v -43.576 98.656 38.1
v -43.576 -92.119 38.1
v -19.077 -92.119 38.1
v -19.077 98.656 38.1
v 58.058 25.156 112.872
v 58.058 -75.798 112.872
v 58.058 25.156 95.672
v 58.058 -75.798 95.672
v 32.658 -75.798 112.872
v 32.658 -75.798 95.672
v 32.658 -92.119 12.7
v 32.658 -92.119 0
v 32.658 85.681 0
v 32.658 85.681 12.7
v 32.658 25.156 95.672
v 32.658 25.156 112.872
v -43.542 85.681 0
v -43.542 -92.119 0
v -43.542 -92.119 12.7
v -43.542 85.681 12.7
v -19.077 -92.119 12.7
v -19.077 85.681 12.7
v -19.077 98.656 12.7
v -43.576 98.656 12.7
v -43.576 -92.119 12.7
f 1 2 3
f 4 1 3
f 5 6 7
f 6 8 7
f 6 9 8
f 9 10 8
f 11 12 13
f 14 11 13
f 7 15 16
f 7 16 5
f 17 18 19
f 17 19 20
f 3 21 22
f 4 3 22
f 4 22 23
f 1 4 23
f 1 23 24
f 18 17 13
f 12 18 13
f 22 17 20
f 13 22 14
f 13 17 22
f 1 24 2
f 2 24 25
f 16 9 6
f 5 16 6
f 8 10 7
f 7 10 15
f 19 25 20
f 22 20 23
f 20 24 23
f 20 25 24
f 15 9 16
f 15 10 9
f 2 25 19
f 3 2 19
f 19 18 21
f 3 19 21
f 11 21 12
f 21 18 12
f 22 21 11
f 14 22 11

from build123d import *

# Parameters (mm, degrees)
F0_W     = 76.2
F0_H     = 177.8
F1_DEPTH = 12.7
F3_DEPTH = 25.4
F4_W     = 100.9536013007
F4_H     = 11.7709934711
F5_DEPTH = 25.4
F6_W     = 25.4
F6_H     = 100.9536013007
F7_DEPTH = 5.4291039705


with BuildPart() as f1:
    # F0 (on Top) → F1 (new body)
    with BuildSketch(Plane.XY):
        with Locations((-5.4415319678, -3.2189898193)):
            Rectangle(F0_W, F0_H)
    extrude(amount=F1_DEPTH)

    # F2 (on face) → F3 (join)
    with BuildSketch(Plane.XY.offset(12.7)):
        Polygon((-43.5415319678, -92.1189898193), (-19.0774220973, -92.1189898193), (-19.0774220973, 42.8526476026), (-19.0774220973, 85.6810101807), (-43.5415319678, 85.6810101807), align=None)
        Polygon((-43.5755159706, -92.1189898193), (-19.0774220973, -92.1189898193), (-19.0774220973, 42.8526476026), (-19.0774220973, 96.1600020528), (-19.0774220973, 98.655846113), (-43.5755159706, 98.655846113), align=None)
    extrude(amount=F3_DEPTH)


with BuildPart() as f5:
    # F4 (on face) → F5 (new body)
    with BuildSketch(Plane.YZ.offset(32.6584680322)):
        with Locations((-25.3210403025, 101.5570759773)):
            Rectangle(F4_W, F4_H)
    extrude(amount=F5_DEPTH)

    # F6 (on face) → F7 (join)
    with BuildSketch(Plane.XY.offset(107.4425727129)):
        with Locations((45.3584680322, -25.3210403025)):
            Rectangle(F6_W, F6_H)
    extrude(amount=F7_DEPTH)


solid = Compound([f1.part, f5.part])
